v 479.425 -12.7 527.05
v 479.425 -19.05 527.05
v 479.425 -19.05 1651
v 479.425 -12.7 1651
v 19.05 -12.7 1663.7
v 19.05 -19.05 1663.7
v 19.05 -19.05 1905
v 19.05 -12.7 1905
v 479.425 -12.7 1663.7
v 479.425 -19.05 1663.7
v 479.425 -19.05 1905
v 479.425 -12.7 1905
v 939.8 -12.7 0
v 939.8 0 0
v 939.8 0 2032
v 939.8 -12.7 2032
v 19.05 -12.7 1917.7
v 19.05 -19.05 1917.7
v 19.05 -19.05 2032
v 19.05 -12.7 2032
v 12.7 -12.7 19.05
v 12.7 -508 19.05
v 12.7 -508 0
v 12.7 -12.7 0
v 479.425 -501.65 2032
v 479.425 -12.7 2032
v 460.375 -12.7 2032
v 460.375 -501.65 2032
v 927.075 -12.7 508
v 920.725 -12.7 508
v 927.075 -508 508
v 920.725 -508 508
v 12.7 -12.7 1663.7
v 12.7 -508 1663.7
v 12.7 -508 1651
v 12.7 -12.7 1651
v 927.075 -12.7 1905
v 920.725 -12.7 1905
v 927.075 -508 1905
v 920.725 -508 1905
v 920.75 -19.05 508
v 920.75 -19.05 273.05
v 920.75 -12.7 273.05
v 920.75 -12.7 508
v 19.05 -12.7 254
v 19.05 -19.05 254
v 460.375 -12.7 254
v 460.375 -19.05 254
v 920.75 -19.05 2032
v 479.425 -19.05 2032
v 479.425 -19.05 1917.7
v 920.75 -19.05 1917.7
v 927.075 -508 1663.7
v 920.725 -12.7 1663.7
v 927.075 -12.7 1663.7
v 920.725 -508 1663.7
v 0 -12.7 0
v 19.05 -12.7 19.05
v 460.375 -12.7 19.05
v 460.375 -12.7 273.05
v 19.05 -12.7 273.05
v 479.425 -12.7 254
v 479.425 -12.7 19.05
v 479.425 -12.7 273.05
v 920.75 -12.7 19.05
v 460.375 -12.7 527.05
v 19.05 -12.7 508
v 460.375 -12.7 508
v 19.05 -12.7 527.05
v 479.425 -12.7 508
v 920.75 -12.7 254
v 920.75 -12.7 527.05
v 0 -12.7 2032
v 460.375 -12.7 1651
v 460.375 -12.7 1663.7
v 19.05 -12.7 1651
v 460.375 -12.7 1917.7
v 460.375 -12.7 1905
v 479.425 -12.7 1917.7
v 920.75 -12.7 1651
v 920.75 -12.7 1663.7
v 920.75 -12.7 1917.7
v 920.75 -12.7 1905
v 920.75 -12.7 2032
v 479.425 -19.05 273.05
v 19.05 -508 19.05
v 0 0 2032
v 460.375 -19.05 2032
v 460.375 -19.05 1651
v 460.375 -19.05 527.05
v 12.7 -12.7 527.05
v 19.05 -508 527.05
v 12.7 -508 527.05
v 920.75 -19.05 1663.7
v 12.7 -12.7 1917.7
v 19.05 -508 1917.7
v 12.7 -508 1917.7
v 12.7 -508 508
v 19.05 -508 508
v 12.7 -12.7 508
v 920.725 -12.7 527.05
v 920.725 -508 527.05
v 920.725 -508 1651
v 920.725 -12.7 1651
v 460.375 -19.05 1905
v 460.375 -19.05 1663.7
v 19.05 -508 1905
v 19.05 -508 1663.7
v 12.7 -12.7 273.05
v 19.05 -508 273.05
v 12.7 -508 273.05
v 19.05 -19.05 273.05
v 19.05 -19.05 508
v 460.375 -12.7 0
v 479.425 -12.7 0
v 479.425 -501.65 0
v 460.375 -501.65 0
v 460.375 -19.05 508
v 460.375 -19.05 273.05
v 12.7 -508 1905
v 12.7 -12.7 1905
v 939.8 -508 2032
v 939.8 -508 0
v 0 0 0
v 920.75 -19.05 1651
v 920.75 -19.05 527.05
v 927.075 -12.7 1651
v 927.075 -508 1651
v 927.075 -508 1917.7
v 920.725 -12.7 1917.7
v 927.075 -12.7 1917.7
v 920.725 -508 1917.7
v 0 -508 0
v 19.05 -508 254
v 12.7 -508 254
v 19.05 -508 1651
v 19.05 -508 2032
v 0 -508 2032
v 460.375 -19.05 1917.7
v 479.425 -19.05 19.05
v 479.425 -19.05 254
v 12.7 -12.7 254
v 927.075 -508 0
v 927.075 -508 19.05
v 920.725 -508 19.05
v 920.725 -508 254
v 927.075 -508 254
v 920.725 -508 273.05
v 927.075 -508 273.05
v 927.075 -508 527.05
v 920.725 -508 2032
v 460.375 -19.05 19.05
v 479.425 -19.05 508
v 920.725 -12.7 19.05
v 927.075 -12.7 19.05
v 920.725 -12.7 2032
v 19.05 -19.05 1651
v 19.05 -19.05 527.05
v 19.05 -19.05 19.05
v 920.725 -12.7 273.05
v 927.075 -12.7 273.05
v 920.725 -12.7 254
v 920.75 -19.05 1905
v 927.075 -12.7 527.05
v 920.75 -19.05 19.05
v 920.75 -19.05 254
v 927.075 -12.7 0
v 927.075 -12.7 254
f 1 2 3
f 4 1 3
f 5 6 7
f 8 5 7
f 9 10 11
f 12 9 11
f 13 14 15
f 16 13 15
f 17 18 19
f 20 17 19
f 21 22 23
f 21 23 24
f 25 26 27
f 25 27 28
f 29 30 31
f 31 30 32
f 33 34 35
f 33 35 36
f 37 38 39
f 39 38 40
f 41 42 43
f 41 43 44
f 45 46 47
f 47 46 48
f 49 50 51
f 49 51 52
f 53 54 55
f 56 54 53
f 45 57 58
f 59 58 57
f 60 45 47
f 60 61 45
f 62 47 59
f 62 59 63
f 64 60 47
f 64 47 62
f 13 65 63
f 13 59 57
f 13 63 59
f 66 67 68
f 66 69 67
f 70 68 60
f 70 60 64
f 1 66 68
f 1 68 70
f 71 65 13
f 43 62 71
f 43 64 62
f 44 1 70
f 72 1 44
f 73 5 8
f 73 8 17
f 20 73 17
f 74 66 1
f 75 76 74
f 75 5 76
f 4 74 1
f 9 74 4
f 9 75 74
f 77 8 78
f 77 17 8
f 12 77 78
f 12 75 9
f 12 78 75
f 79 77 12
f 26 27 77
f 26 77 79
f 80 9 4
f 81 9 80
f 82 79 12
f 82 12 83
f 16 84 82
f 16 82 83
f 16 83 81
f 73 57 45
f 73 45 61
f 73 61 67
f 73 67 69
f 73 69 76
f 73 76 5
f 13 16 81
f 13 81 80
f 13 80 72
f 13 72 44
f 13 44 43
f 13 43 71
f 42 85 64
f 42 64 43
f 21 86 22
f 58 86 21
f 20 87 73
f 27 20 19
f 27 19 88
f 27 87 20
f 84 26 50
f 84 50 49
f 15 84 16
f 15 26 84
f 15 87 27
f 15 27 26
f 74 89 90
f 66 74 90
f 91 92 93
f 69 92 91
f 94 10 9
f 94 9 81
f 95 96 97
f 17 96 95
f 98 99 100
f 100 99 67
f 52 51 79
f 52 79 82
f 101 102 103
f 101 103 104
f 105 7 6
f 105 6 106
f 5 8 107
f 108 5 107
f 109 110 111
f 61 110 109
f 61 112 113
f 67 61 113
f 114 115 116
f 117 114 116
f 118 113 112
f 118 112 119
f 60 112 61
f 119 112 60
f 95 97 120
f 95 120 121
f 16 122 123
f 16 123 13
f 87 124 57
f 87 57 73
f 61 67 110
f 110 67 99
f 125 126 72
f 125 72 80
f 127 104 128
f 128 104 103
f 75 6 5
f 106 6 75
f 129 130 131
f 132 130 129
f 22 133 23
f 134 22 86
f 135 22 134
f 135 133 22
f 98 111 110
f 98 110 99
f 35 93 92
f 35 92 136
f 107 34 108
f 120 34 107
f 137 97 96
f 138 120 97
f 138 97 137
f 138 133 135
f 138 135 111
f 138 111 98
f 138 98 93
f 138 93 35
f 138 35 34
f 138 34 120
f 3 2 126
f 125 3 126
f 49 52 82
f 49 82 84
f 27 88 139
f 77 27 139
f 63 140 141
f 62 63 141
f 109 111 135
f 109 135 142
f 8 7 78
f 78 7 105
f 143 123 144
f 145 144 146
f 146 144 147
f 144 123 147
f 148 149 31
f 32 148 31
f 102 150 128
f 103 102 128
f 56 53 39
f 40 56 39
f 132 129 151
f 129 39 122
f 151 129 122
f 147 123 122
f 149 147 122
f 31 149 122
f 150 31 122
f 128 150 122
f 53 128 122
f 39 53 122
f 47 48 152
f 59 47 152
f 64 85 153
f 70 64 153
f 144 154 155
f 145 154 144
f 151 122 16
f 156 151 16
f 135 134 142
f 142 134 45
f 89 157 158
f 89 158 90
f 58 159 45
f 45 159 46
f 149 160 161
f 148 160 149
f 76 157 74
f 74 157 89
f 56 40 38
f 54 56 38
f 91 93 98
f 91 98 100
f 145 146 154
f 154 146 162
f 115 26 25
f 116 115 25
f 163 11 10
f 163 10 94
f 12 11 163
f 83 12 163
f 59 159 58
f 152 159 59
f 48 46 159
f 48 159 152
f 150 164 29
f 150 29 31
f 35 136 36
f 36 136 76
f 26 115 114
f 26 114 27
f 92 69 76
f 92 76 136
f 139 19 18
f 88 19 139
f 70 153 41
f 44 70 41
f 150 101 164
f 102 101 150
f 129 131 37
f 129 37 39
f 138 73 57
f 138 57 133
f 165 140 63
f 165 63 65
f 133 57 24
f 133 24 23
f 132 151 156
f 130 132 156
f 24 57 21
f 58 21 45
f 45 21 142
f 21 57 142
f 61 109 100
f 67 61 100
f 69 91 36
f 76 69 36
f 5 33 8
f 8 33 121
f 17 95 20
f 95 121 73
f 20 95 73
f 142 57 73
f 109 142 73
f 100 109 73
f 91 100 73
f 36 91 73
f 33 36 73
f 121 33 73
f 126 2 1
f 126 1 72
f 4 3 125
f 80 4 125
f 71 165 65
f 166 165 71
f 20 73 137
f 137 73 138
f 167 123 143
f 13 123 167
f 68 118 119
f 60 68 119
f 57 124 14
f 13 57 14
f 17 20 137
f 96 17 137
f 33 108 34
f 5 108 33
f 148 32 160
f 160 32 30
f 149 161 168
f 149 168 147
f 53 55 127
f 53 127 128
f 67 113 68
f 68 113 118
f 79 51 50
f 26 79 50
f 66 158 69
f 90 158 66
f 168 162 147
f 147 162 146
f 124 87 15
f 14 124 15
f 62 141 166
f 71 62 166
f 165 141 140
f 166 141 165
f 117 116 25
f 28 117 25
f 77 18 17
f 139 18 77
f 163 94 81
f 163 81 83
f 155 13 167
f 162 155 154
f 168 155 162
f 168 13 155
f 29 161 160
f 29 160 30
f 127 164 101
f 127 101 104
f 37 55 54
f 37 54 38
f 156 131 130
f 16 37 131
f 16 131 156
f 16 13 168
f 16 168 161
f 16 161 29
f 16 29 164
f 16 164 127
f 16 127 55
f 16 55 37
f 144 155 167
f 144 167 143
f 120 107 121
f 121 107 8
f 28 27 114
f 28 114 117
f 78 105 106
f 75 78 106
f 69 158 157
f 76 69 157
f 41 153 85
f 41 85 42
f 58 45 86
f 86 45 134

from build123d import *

# Parameters (mm, degrees)
F0_W      = 939.8
F0_H      = 2032
F1_DEPTH  = 19.05
F2_W      = 19.05
F2_H      = 2032
F3_DEPTH  = 6.35
F4_W      = 495.3
F4_H      = 2032
F5_DEPTH  = 19.0754
F6_W      = 495.3
F6_H      = 2032
F7_DEPTH  = 19.05
F8_W      = 488.95
F8_H      = 2032
F9_DEPTH  = 19.05
F10_W     = 901.7
F10_H     = 19.05
F10_H_2   = 12.7
F11_DEPTH = 6.35
F12_W     = 495.3
F12_H     = 19.05
F12_H_2   = 12.7
F13_DEPTH = 6.35
F14_W     = 495.3
F14_H     = 12.7
F14_H_2   = 19.05
F15_DEPTH = 6.35


with BuildPart() as f1:
    # F0 (on Front) → F1 (new body)
    with BuildSketch(Plane.XZ):
        with Locations((469.9, 1016)):
            Rectangle(F0_W, F0_H)
    extrude(amount=F1_DEPTH)

    # F2 (on face) → F3 (cut)
    with BuildSketch(Plane.XZ.offset(19.05)):
        with Locations((9.525, 1016)):
            Rectangle(F2_W, F2_H)
        with Locations((930.275, 1016)):
            Rectangle(F2_W, F2_H)
        Polygon((479.425, 2032), (469.9, 2032), (460.375, 2032), (460.375, 0), (469.9, 0), (479.425, 0), align=None)
    extrude(amount=-F3_DEPTH, mode=Mode.SUBTRACT)

    # F10 (on face) → F11 (cut)
    with BuildSketch(Plane.XZ.offset(19.05)):
        with Locations((469.9, 9.525)):
            Rectangle(F10_W, F10_H)
        with Locations((469.9, 263.525)):
            Rectangle(F10_W, F10_H)
        with Locations((469.9, 517.525)):
            Rectangle(F10_W, F10_H)
        with Locations((469.9, 1657.35)):
            Rectangle(F10_W, F10_H_2)
        with Locations((469.9, 1911.35)):
            Rectangle(F10_W, F10_H_2)
    extrude(amount=-F11_DEPTH, mode=Mode.SUBTRACT)


with BuildPart() as f5:
    # F4 (on face) → F5 (new body)
    with BuildSketch(Plane.YZ.offset(939.8)):
        with Locations((-260.35, 1016)):
            Rectangle(F4_W, F4_H)
    extrude(amount=-F5_DEPTH)

    # F14 (on face) → F15 (cut)
    with BuildSketch(Plane(origin=(920.7246, 0, 0), x_dir=(0, -1, 0), z_dir=(-1, 0, 0))):
        with Locations((260.35, 1911.35)):
            Rectangle(F14_W, F14_H)
        with Locations((260.35, 1657.35)):
            Rectangle(F14_W, F14_H)
        with Locations((260.35, 517.525)):
            Rectangle(F14_W, F14_H_2)
        with Locations((260.35, 263.525)):
            Rectangle(F14_W, F14_H_2)
        with Locations((260.35, 9.525)):
            Rectangle(F14_W, F14_H_2)
    extrude(amount=-F15_DEPTH, mode=Mode.SUBTRACT)


with BuildPart() as f7:
    # F6 (on face) → F7 (new body)
    with BuildSketch(Plane(origin=(0, 0, 0), x_dir=(0, -1, 0), z_dir=(-1, 0, 0))):
        with Locations((260.35, 1016)):
            Rectangle(F6_W, F6_H)
    extrude(amount=-F7_DEPTH)

    # F12 (on face) → F13 (cut)
    with BuildSketch(Plane.YZ.offset(19.05)):
        with Locations((-260.35, 263.525)):
            Rectangle(F12_W, F12_H)
        with Locations((-260.35, 517.525)):
            Rectangle(F12_W, F12_H)
        with Locations((-260.35, 1911.35)):
            Rectangle(F12_W, F12_H_2)
        with Locations((-260.35, 9.525)):
            Rectangle(F12_W, F12_H)
        with Locations((-260.35, 1657.35)):
            Rectangle(F12_W, F12_H_2)
    extrude(amount=-F13_DEPTH, mode=Mode.SUBTRACT)


with BuildPart() as f9:
    # F8 (on face) → F9 (new body)
    with BuildSketch(Plane(origin=(479.425, 0, 0), x_dir=(0, -1, 0), z_dir=(-1, 0, 0))):
        with Locations((257.175, 1016)):
            Rectangle(F8_W, F8_H)
    extrude(amount=F9_DEPTH)


solid = Compound([f1.part, f5.part, f7.part, f9.part])
